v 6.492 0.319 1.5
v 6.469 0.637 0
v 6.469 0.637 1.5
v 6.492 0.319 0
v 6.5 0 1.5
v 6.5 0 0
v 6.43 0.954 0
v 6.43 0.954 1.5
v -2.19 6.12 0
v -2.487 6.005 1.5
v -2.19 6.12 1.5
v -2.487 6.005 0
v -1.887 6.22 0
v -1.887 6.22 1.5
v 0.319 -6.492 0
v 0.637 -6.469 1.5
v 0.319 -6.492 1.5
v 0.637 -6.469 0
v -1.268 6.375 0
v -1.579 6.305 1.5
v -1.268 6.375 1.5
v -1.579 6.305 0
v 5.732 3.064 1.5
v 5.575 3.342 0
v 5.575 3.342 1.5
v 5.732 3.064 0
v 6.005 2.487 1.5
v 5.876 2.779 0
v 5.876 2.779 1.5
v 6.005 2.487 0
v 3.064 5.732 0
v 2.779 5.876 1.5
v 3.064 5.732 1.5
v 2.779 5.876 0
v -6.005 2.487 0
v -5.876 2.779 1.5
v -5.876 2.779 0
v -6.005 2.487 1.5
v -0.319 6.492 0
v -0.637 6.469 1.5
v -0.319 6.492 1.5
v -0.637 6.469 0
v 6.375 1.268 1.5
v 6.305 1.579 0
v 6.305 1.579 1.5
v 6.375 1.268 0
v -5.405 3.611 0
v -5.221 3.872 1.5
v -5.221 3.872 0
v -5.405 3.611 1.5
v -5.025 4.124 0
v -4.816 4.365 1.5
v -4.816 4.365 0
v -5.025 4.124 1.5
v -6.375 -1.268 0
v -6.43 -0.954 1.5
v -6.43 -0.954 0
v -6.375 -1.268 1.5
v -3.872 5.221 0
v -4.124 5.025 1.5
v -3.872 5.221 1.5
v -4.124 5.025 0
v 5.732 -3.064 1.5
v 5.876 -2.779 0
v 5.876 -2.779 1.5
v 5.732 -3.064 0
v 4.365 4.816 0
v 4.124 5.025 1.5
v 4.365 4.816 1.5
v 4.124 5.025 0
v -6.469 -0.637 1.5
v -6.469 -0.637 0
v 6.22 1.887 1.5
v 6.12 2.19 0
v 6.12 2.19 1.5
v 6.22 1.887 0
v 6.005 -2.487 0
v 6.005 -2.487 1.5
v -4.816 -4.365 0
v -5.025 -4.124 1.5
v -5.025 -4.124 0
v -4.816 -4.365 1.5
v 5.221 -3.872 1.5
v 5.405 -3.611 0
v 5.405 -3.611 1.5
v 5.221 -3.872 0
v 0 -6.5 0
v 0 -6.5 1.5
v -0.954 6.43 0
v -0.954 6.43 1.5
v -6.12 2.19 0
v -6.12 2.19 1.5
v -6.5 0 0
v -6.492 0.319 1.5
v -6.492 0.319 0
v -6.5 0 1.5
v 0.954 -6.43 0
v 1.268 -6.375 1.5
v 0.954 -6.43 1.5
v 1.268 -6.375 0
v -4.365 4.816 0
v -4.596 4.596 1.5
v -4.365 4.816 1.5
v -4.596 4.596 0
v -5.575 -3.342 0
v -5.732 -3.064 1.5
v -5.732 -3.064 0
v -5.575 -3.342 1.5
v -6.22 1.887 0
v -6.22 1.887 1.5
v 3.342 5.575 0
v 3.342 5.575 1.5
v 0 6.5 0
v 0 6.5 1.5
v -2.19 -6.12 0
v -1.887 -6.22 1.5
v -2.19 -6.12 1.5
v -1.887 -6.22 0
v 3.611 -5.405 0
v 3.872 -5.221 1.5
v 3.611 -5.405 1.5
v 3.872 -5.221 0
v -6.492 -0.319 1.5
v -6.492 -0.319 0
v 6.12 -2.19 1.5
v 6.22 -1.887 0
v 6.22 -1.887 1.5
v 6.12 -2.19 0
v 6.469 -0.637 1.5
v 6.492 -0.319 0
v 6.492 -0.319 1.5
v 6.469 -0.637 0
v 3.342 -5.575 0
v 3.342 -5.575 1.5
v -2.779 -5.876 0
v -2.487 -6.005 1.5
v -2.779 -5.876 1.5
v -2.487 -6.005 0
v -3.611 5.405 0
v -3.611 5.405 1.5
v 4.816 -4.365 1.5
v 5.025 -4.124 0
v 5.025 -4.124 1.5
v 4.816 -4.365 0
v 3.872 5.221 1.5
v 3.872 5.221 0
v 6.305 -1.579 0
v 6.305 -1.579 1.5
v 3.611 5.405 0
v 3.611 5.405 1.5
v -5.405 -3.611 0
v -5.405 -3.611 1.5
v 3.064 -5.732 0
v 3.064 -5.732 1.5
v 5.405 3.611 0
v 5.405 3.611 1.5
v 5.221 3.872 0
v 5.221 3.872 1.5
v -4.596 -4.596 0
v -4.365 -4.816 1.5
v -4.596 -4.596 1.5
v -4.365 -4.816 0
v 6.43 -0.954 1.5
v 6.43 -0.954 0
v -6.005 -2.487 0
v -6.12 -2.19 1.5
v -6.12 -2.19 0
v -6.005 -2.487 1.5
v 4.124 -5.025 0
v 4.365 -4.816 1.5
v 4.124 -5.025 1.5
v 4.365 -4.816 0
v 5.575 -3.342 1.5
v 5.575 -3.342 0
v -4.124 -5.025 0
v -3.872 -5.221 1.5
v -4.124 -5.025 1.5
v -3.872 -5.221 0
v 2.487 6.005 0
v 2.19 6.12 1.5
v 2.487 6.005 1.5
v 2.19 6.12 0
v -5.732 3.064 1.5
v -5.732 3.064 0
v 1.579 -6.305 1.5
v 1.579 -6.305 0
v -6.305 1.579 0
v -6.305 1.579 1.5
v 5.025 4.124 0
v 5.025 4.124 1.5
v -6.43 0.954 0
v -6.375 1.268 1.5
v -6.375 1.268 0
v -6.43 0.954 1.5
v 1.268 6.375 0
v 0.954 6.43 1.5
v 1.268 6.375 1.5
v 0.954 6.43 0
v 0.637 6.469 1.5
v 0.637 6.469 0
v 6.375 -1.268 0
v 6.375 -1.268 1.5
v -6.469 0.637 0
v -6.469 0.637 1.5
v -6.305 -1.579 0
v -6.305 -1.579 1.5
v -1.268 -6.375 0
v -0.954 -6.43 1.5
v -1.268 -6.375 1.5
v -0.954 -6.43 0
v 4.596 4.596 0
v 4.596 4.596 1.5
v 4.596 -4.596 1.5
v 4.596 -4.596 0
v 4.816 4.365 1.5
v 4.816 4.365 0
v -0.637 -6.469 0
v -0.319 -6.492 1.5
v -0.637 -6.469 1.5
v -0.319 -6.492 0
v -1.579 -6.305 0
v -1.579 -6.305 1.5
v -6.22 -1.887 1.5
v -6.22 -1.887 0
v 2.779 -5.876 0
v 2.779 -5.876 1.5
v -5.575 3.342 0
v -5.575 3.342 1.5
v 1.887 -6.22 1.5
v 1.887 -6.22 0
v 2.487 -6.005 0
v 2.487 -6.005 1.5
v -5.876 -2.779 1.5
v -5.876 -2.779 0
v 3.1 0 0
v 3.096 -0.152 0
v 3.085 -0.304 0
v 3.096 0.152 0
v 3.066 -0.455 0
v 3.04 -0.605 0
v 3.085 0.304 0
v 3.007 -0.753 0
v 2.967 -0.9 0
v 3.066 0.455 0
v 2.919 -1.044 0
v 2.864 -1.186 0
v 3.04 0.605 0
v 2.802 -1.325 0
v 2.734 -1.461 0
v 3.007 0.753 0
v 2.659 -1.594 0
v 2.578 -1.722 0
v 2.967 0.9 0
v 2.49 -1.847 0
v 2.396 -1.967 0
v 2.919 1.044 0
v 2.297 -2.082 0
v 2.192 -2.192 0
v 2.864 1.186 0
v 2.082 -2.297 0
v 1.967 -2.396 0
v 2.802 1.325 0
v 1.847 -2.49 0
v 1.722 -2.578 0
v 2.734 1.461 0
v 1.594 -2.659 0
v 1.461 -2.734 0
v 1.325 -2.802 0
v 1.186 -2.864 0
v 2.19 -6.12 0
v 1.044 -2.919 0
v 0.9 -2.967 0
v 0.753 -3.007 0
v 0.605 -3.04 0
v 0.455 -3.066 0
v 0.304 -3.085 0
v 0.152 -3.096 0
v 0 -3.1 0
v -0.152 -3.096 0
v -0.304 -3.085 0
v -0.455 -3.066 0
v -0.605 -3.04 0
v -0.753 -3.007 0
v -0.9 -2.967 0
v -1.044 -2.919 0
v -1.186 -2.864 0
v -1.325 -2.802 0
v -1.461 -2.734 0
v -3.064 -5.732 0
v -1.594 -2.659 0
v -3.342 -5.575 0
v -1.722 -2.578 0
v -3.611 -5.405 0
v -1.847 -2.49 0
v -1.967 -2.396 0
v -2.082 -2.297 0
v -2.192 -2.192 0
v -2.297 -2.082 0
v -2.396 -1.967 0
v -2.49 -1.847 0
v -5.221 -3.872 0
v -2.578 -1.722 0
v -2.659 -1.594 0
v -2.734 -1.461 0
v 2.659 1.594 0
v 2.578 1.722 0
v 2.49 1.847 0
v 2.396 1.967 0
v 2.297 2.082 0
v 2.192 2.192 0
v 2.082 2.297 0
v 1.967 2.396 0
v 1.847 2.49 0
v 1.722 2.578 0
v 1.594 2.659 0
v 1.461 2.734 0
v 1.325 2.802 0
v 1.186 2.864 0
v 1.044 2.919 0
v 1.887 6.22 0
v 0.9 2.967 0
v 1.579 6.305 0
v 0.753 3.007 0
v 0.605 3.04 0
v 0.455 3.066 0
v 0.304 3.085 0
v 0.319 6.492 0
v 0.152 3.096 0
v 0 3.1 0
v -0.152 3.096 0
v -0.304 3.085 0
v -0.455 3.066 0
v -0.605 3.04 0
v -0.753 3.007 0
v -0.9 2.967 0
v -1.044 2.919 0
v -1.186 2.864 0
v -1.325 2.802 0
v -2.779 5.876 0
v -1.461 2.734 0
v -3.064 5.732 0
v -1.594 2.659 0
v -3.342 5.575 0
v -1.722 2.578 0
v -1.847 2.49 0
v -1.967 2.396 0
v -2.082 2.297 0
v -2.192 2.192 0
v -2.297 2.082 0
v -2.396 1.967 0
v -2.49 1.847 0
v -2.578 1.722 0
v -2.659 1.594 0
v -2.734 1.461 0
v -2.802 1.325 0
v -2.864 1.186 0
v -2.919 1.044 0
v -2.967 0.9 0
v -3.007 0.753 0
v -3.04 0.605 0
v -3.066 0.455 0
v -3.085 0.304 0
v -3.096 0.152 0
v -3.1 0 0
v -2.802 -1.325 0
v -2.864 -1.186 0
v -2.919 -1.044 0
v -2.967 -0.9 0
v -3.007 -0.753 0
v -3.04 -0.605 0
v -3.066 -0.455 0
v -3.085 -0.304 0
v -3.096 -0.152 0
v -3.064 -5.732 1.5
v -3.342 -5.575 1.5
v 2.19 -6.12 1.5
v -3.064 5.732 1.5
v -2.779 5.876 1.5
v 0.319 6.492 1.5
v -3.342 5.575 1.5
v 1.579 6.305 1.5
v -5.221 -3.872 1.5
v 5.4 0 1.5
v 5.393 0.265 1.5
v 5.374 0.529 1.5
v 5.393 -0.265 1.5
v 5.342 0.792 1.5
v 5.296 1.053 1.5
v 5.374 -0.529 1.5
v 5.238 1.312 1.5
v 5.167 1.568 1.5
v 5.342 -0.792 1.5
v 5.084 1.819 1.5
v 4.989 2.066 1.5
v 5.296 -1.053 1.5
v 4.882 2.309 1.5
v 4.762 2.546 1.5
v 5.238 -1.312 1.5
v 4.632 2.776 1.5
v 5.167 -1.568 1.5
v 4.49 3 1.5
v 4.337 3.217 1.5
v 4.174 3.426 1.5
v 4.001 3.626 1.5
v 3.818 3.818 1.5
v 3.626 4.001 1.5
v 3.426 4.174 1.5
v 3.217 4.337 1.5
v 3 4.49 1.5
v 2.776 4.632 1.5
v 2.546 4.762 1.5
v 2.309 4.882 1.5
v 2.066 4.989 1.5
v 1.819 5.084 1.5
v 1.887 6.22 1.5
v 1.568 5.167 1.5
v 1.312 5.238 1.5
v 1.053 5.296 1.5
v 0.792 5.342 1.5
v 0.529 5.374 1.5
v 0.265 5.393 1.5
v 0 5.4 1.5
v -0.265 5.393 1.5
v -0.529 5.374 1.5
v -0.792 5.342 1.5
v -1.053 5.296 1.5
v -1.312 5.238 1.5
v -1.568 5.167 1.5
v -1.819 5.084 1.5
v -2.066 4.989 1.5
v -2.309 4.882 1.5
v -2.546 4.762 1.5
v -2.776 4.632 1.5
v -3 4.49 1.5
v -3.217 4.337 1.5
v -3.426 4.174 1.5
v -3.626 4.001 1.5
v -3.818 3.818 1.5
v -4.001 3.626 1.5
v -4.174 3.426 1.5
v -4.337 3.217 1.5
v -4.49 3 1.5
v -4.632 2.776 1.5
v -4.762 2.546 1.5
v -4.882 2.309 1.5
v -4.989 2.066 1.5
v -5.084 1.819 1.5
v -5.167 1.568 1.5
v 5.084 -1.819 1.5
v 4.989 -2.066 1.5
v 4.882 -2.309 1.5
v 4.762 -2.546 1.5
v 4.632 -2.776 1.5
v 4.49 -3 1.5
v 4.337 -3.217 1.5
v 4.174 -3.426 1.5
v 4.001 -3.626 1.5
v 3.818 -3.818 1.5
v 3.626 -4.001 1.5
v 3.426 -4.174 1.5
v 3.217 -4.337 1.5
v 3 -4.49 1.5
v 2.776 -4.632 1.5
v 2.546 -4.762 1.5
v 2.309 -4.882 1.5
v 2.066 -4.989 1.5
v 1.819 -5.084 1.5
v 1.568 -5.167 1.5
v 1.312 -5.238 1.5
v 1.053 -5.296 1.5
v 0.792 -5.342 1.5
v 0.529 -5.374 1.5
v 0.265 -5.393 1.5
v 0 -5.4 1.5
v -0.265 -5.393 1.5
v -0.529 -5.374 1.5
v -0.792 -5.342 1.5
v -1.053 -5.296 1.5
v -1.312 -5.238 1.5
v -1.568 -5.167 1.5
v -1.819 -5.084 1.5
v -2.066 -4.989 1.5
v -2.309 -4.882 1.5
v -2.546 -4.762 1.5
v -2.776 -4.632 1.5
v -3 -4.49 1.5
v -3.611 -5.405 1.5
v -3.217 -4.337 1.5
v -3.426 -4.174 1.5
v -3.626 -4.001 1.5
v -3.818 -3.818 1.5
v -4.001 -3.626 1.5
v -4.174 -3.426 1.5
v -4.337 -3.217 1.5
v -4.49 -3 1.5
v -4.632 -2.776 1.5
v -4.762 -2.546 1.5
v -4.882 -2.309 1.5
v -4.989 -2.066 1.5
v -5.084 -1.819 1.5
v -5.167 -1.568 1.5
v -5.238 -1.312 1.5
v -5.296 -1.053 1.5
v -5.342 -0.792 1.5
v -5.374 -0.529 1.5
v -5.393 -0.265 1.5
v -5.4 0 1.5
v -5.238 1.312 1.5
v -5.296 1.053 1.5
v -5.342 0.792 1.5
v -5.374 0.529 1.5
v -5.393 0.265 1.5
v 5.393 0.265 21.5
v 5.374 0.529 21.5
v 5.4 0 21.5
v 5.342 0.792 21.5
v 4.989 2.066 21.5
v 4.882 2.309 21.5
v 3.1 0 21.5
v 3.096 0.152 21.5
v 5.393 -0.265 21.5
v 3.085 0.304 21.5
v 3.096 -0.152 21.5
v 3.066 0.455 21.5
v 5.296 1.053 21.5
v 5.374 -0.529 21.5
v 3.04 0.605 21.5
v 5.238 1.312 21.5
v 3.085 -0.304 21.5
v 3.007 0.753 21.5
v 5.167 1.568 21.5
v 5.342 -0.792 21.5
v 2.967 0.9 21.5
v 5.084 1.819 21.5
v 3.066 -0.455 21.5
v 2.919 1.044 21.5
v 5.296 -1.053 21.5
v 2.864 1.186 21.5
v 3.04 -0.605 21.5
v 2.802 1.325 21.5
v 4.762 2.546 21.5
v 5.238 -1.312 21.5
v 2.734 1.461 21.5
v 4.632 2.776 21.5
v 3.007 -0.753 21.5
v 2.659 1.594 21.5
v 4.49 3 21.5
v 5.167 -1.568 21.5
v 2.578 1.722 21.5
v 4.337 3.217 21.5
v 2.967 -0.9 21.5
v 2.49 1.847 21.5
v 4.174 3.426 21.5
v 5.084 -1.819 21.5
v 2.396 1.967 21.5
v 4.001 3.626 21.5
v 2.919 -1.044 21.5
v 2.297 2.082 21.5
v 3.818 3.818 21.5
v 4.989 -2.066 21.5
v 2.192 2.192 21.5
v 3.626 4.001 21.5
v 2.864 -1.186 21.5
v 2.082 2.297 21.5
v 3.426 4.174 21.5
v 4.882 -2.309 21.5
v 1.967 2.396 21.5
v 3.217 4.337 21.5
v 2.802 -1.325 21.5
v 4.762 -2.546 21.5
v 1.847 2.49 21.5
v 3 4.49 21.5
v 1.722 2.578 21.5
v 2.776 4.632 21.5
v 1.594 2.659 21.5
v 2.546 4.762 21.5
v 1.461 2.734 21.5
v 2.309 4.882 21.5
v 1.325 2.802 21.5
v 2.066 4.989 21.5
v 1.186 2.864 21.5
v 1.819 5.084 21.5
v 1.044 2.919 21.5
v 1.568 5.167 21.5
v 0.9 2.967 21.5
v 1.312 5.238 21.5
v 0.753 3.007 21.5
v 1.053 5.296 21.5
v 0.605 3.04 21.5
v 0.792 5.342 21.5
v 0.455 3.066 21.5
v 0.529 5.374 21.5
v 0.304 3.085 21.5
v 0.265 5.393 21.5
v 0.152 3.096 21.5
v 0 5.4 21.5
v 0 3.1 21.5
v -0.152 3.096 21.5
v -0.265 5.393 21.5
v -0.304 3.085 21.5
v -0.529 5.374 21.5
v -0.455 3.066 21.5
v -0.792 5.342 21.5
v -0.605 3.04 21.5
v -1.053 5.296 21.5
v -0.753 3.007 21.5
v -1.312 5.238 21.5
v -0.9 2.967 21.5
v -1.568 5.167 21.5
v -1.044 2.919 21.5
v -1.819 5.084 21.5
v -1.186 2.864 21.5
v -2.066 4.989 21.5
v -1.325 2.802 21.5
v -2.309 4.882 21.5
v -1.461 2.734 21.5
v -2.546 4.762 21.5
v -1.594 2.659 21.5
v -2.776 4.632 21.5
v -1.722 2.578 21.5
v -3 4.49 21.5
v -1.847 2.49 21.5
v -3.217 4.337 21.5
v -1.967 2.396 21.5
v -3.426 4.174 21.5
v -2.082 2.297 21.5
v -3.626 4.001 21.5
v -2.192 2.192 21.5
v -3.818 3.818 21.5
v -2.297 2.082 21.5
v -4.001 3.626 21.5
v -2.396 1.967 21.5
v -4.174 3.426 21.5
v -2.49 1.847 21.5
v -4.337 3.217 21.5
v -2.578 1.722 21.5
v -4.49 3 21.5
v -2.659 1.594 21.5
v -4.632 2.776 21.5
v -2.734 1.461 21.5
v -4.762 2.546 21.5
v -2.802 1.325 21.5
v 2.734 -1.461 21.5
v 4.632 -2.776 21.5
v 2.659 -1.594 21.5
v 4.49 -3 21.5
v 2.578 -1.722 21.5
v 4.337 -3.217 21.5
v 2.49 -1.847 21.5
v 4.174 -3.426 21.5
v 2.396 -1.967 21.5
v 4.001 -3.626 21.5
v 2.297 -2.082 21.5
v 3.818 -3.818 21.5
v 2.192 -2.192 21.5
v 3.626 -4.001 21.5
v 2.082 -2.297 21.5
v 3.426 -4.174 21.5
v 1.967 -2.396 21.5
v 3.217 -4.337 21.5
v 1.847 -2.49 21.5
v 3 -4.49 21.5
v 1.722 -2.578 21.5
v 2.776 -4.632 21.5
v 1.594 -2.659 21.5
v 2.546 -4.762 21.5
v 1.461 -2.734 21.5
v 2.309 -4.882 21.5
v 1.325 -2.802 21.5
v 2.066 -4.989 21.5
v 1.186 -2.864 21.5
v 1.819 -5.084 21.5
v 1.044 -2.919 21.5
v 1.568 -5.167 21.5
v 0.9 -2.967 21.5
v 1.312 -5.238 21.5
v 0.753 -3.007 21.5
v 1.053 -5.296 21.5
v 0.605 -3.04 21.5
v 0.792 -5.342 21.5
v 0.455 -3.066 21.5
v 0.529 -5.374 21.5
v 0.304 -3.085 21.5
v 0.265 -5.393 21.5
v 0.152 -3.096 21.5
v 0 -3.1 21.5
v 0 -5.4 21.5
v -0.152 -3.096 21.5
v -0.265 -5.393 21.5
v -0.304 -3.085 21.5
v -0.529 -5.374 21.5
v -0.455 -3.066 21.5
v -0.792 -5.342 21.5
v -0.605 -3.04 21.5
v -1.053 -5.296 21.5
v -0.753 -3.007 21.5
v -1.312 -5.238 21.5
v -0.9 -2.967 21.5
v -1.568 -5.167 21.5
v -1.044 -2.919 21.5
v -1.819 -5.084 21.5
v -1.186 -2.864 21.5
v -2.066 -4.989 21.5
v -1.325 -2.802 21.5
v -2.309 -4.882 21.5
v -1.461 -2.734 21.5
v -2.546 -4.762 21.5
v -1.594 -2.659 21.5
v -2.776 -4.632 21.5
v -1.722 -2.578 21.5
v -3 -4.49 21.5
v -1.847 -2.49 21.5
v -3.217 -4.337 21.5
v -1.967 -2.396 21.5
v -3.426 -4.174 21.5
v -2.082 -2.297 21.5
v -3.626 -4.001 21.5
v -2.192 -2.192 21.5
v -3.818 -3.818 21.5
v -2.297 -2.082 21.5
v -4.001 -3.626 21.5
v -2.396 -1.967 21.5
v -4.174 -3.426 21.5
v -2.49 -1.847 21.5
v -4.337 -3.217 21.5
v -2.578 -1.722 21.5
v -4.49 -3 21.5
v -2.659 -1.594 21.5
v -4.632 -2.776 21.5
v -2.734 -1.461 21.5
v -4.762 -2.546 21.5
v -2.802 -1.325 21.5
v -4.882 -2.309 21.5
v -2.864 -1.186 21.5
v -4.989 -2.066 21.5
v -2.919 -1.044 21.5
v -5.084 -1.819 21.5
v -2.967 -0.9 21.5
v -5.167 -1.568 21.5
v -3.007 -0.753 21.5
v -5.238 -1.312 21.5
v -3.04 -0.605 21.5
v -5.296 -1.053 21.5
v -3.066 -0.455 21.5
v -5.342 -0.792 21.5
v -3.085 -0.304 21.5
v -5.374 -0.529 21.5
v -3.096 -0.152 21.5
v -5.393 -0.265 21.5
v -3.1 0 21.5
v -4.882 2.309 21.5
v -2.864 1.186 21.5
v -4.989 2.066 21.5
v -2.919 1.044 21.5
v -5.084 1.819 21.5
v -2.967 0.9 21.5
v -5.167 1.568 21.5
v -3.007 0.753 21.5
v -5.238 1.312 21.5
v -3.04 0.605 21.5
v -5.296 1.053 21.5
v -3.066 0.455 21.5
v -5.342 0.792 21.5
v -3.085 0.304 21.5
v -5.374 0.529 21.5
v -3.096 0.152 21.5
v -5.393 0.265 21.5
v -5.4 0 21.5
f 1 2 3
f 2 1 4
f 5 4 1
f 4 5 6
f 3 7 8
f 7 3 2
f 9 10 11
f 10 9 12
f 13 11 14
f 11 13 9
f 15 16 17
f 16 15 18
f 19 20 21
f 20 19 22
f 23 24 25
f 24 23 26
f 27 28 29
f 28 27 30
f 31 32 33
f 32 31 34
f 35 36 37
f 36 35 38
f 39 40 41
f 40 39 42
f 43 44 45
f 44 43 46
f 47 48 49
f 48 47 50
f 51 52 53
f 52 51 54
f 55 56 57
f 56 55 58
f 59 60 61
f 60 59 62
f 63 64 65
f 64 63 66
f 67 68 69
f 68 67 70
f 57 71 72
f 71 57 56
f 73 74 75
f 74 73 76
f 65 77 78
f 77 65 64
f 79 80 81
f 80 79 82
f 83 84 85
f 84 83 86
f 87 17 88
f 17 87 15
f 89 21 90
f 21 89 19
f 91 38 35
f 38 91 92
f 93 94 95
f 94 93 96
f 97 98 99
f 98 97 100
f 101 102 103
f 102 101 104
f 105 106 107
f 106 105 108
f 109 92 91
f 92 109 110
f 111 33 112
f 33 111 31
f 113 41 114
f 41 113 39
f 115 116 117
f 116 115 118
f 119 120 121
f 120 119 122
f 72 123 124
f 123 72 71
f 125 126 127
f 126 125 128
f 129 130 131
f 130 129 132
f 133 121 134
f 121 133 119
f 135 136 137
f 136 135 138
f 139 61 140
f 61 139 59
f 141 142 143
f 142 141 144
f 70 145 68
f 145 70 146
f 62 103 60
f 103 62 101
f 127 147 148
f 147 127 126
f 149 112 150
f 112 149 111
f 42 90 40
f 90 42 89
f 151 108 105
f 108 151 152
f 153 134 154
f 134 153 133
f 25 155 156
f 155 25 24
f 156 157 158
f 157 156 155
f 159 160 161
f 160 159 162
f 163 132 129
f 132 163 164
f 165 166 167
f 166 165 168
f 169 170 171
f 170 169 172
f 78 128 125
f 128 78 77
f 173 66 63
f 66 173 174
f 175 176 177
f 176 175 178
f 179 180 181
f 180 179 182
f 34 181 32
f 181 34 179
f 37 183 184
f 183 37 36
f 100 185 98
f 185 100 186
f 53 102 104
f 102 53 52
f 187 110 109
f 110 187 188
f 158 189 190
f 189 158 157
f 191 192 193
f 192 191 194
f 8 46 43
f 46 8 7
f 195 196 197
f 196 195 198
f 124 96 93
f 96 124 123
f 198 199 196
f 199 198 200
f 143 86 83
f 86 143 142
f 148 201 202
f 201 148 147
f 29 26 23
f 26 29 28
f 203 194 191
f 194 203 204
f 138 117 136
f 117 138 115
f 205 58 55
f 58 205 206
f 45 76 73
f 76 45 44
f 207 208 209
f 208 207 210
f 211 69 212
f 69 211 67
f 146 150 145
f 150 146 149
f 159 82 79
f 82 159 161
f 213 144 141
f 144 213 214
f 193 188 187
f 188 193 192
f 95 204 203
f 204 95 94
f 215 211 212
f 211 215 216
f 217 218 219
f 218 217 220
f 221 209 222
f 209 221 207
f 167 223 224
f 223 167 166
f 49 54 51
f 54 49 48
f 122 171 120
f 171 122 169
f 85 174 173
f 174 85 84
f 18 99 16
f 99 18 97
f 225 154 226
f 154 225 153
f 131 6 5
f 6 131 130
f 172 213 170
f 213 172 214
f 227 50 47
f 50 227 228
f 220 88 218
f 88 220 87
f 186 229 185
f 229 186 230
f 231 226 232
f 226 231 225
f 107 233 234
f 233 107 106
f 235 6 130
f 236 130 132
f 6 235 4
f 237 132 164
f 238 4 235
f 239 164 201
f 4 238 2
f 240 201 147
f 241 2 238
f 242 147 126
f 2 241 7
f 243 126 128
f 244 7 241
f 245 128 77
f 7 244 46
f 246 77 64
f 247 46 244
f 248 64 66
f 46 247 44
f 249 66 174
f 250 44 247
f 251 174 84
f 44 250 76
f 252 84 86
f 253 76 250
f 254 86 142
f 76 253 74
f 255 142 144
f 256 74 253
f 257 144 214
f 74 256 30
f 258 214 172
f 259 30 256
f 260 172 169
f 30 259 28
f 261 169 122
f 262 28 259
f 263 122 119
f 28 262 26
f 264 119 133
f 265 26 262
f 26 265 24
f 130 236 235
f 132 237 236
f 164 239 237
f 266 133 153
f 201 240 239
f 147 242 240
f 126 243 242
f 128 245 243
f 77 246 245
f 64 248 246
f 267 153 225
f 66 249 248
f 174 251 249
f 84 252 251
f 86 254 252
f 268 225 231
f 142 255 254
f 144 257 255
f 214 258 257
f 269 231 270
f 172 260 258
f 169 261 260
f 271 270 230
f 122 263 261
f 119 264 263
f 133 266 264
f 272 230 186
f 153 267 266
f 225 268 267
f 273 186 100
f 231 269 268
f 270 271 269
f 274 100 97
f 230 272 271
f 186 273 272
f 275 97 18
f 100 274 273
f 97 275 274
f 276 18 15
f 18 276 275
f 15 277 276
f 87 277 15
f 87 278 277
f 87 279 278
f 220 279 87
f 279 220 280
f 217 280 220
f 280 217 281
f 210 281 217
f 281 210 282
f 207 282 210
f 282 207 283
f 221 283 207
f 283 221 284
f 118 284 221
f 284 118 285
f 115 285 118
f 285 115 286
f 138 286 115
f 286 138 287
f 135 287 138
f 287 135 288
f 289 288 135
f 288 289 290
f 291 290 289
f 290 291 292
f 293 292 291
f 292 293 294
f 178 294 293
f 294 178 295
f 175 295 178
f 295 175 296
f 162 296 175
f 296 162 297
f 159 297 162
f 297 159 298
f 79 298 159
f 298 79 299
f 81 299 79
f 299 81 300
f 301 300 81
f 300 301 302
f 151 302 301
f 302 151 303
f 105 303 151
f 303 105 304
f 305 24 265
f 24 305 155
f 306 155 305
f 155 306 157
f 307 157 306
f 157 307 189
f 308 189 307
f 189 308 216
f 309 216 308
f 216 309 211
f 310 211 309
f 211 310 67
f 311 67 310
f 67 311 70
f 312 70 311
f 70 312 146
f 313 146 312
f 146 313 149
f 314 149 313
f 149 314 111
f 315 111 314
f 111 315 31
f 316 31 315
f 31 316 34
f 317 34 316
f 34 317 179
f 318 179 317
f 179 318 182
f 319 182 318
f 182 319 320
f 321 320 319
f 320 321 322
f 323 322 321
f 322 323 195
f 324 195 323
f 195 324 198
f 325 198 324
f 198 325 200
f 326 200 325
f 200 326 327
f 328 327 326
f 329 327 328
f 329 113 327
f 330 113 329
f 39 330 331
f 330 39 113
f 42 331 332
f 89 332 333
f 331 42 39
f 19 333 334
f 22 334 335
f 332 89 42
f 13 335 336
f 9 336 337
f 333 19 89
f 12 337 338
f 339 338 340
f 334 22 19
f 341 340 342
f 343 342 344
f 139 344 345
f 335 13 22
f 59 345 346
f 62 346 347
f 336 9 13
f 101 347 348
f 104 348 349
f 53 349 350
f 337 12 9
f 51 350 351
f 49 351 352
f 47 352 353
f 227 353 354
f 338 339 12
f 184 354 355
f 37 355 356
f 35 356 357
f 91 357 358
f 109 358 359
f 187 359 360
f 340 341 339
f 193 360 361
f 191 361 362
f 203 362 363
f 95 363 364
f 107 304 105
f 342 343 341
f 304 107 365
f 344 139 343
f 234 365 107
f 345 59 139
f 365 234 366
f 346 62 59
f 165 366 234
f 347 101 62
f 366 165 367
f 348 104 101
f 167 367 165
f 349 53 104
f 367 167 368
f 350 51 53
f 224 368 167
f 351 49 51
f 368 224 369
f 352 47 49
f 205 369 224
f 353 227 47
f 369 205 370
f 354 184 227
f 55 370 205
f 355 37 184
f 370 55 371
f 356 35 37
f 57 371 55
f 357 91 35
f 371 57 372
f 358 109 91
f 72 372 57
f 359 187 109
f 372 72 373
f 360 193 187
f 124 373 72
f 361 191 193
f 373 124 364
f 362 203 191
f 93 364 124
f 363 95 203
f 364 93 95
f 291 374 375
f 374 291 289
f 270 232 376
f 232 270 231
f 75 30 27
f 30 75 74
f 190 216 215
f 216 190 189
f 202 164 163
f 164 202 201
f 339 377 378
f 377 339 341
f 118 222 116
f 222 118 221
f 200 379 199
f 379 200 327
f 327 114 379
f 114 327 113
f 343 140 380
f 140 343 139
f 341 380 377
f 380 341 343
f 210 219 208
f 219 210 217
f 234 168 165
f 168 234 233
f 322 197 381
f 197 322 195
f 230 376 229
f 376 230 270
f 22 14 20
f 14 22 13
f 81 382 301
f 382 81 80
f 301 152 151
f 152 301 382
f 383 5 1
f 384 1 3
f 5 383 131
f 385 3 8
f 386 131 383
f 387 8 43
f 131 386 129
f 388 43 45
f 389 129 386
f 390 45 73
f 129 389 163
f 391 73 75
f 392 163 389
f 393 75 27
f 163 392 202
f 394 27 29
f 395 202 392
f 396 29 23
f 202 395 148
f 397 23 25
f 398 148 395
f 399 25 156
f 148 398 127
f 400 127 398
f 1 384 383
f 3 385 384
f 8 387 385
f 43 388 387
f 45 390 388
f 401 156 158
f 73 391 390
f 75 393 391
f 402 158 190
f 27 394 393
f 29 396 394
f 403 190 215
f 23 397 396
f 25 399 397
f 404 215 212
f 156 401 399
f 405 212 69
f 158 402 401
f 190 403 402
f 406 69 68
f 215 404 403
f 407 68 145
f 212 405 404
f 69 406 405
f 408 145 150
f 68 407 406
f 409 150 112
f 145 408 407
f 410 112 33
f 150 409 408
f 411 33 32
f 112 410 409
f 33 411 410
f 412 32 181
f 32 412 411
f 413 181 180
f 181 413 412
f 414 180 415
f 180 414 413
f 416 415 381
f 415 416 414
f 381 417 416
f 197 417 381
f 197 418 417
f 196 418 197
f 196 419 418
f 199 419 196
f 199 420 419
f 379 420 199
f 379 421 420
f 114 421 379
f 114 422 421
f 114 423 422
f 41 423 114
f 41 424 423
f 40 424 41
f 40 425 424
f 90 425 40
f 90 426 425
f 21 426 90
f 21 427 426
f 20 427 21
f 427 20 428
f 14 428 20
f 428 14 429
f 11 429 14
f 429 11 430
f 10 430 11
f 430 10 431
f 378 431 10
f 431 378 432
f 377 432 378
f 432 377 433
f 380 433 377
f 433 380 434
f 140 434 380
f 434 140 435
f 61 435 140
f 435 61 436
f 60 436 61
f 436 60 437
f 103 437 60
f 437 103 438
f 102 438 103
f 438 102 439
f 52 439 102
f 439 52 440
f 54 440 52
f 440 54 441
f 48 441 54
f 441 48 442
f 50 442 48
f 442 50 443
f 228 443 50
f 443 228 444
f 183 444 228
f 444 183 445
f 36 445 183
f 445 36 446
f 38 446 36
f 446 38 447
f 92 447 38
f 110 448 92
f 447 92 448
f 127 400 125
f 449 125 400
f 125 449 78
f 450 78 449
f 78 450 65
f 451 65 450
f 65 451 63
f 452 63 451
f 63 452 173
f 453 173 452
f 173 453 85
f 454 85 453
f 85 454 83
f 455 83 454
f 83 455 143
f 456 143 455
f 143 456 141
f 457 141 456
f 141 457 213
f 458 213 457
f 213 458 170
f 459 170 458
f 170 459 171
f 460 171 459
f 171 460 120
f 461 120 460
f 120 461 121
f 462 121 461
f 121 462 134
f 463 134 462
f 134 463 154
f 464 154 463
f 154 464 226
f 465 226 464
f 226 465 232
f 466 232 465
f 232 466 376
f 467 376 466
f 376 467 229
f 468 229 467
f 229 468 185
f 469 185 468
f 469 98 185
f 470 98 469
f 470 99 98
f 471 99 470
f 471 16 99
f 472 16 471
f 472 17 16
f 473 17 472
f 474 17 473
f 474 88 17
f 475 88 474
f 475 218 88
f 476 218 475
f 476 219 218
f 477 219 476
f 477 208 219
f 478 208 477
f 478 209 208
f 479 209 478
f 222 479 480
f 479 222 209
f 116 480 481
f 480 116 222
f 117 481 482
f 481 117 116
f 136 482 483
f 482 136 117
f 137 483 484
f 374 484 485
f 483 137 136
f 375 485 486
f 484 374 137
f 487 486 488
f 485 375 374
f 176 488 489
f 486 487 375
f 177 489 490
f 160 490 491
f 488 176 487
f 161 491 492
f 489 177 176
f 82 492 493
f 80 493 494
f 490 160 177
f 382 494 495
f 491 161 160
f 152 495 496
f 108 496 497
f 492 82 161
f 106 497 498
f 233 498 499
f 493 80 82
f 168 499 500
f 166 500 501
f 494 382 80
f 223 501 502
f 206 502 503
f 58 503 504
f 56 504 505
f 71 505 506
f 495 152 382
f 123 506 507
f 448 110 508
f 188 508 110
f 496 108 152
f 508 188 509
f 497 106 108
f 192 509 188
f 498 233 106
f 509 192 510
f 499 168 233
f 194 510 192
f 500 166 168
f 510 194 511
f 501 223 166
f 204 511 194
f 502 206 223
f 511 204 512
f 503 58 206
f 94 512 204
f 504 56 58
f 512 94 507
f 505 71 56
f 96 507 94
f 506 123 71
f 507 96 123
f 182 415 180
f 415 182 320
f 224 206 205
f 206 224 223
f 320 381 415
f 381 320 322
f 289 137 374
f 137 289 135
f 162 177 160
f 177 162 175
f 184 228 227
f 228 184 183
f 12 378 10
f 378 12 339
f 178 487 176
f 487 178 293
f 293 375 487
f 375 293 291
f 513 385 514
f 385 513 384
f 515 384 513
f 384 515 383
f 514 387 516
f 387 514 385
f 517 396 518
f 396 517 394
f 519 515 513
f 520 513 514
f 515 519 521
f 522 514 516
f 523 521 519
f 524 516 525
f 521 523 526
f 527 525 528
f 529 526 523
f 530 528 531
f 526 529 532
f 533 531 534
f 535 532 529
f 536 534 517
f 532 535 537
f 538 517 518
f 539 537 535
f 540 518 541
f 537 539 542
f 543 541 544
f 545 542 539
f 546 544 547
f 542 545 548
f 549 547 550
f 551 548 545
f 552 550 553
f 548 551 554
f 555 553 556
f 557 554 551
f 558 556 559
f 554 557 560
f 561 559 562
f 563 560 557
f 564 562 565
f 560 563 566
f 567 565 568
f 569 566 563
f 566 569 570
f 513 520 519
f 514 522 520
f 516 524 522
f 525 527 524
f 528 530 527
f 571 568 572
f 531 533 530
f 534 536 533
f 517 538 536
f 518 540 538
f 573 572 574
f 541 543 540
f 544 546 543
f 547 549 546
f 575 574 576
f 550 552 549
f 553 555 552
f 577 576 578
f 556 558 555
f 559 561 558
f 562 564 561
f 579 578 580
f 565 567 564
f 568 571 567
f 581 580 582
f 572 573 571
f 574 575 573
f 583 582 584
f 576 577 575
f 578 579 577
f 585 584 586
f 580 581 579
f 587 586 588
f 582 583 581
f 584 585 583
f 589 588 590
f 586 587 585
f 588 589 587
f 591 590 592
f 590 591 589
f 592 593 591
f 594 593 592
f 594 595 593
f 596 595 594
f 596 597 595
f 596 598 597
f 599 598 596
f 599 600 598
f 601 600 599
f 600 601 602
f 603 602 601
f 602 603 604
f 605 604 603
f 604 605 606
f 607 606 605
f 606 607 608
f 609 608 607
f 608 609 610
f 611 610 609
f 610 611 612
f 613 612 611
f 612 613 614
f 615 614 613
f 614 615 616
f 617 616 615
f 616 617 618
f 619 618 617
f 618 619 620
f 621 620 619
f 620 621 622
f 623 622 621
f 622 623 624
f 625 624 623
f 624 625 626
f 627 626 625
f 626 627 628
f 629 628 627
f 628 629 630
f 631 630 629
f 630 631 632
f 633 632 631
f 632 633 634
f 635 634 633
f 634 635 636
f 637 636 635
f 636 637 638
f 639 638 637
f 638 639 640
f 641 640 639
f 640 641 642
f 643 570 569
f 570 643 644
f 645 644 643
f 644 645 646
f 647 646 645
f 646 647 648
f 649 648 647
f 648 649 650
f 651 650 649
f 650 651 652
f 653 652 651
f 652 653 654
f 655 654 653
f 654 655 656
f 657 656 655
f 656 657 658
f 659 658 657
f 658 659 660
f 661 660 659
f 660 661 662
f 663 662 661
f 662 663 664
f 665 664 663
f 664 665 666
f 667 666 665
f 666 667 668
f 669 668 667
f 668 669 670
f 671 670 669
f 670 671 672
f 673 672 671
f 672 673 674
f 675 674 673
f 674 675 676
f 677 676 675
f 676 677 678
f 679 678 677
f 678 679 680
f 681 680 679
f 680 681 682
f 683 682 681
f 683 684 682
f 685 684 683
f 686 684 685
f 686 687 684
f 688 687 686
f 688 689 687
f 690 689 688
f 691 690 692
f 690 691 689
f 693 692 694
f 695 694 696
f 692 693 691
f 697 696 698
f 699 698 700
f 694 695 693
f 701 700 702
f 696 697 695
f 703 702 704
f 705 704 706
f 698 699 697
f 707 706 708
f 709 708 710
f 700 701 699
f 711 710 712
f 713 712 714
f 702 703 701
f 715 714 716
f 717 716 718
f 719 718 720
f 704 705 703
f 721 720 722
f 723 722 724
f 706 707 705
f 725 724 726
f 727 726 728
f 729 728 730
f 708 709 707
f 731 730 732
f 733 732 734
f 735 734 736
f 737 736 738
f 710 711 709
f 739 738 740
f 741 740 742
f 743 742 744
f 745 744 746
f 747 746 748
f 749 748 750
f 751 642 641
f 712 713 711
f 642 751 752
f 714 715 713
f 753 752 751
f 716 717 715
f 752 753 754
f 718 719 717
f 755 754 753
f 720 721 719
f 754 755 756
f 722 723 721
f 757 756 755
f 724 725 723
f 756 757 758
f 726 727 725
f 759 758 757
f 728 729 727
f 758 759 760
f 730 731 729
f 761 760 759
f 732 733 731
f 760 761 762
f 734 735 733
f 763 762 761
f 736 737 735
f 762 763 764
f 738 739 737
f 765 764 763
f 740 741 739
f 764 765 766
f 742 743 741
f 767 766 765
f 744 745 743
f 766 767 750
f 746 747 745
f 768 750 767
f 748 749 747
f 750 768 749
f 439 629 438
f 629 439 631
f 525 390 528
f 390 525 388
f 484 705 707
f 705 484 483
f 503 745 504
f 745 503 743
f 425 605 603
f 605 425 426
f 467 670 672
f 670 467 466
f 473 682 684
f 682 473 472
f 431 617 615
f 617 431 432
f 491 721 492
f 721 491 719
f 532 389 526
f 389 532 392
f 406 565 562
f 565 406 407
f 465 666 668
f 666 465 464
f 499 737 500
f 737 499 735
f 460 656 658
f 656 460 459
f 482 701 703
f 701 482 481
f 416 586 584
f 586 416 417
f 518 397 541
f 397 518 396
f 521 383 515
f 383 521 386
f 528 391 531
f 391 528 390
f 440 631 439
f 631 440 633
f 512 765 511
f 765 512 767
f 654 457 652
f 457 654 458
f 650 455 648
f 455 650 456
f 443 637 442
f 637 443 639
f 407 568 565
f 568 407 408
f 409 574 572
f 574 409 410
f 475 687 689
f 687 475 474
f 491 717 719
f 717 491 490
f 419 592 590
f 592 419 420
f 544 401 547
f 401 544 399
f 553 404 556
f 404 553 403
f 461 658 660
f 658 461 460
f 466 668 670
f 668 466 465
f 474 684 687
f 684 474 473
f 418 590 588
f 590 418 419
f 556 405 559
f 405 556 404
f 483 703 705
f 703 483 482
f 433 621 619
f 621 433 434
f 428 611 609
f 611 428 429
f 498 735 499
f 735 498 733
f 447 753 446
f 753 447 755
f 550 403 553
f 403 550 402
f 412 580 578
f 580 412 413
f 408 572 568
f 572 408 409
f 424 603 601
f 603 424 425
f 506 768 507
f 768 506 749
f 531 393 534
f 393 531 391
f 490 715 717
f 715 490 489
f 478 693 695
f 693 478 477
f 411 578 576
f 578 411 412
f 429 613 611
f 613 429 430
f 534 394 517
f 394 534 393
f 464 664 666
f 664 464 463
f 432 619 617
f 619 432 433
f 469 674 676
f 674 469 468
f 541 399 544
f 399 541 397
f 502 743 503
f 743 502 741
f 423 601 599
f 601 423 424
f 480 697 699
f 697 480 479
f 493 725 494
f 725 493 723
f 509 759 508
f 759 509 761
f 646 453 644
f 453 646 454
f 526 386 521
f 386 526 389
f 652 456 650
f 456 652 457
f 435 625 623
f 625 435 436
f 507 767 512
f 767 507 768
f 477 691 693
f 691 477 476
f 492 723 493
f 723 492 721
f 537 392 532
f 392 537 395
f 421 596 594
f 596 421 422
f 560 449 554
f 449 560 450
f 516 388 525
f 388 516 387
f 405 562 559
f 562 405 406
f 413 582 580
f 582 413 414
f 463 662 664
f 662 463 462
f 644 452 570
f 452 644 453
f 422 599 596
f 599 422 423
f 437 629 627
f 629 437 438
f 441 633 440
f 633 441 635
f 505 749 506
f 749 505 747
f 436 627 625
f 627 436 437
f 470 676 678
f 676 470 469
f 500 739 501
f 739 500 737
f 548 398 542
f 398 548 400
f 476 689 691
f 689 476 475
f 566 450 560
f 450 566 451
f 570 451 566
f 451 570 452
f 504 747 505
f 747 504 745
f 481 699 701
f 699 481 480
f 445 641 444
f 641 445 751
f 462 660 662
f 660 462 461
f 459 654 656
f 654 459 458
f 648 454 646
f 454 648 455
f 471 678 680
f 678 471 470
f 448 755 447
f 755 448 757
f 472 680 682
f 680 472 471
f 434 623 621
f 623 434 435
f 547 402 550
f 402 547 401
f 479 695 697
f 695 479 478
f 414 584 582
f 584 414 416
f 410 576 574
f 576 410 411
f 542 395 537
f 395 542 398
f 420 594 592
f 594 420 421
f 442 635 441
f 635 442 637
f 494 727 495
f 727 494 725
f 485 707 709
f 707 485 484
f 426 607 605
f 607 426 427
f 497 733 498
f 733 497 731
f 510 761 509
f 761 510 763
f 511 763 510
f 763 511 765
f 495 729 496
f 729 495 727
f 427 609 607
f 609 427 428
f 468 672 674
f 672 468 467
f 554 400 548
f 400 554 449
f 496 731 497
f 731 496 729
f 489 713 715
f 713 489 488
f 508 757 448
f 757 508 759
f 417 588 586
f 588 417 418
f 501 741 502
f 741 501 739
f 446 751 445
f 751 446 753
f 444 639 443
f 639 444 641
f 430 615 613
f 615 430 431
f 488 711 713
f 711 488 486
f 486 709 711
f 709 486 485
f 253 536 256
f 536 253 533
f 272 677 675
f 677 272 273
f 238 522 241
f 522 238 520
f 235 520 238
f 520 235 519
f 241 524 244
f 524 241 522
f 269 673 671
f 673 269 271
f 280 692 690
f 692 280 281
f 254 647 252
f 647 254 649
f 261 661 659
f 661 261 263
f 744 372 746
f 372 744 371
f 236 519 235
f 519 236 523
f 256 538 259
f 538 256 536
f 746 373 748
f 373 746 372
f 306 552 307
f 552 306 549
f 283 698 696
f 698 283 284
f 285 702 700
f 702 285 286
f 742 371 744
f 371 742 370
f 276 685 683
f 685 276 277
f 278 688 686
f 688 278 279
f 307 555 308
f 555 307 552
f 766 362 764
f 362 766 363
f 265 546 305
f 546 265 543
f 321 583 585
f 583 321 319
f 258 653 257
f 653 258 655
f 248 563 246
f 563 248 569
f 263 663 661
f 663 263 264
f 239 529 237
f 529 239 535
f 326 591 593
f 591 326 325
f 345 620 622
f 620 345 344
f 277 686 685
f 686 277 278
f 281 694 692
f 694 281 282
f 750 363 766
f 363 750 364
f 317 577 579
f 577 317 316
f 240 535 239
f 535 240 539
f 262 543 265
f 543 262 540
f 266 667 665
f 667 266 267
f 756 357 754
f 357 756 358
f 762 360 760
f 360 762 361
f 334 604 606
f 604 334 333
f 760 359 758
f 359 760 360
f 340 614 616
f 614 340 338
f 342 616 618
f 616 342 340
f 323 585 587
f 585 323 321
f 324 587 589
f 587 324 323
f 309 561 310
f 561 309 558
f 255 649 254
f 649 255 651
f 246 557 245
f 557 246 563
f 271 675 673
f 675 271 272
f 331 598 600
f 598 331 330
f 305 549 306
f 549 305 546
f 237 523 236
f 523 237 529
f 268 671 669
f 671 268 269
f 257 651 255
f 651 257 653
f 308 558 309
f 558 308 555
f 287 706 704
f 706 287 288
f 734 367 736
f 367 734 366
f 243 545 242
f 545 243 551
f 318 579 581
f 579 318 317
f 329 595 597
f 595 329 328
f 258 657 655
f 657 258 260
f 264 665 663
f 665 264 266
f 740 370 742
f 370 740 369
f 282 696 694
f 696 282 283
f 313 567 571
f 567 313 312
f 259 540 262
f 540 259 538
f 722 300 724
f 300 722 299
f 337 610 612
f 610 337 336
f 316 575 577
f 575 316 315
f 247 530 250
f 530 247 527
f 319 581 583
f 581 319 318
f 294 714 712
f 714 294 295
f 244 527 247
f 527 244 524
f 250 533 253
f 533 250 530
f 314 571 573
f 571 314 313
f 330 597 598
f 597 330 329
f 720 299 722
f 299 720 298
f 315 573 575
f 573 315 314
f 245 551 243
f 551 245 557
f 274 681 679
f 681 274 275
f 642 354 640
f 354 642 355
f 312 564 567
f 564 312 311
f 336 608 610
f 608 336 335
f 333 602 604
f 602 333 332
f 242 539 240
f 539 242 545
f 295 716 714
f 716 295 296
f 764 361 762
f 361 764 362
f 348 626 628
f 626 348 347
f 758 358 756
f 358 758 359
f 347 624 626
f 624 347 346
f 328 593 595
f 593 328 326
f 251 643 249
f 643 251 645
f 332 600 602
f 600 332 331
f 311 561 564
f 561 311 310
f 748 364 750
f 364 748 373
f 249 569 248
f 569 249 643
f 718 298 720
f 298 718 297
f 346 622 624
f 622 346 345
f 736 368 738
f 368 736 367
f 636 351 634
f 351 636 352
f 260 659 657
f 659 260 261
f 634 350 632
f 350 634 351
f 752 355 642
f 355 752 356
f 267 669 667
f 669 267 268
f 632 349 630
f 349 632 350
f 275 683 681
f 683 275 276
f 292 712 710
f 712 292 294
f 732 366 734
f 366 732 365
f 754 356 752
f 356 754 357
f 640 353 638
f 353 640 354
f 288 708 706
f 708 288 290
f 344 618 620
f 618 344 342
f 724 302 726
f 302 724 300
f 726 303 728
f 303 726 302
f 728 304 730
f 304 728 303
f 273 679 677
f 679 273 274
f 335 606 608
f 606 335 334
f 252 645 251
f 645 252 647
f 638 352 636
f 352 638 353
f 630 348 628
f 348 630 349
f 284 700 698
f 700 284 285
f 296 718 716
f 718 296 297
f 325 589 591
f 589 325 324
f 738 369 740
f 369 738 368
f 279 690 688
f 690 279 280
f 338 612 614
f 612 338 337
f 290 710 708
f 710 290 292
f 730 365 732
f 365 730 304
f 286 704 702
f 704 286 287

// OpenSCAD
// Adapter Sleeve for 0.2mL PCR tube in 1.5mL rack
// Print orientation: Upside down (Collar on bed)
// Units: mm

// Dimensions
$fn = 128; // High resolution for smooth cylinders

// Collar (Base)
$collar_outer_d = 13;
$collar_thickness = 1.5;

// Sleeve Body
$sleeve_outer_d = 10.8;
$sleeve_total_height = 21.5;

// Bore
$bore_diameter = 6.2;

// Offset for cutting operations (Rule 5)
$cut_offset = 0.1;

// Calculate radii
$r_collar_outer = $collar_outer_d / 2;
$r_sleeve_outer = $sleeve_outer_d / 2;
$r_bore = $bore_diameter / 2;

// Build the part
// Strategy: Create the full outer shape (Collar + Body) as a union,
// then subtract a single long cylinder for the bore. This ensures perfect alignment
// and a continuous hole through the entire height.

difference() {
    // 1. Create the full outer geometry
    union() {
        // Collar: Lies on XY plane from z=0 to z=1.5
        cylinder(
            h = $collar_thickness,
            d = $collar_outer_d,
            center = [0, 0, $collar_thickness / 2]
        );
        
        // Sleeve Body: Rises from z=1.5 to z=21.5
        // Height of body = 21.5 - 1.5 = 20.0
        translate([0, 0, $collar_thickness]) {
            cylinder(
                h = $sleeve_total_height - $collar_thickness,
                d = $sleeve_outer_d,
                center = [0, 0, ($sleeve_total_height - $collar_thickness) / 2 + $collar_thickness]
            );
        }
    }
    
    // 2. Subtract the bore
    // The bore must run through the FULL height (0 to 21.5)
    // We extend the cutting cylinder slightly past the top and bottom faces (Rule 5)
    cylinder(
        h = $sleeve_total_height + $cut_offset * 2,
        d = $bore_diameter,
        center = [0, 0, $sleeve_total_height / 2]
    );
}
